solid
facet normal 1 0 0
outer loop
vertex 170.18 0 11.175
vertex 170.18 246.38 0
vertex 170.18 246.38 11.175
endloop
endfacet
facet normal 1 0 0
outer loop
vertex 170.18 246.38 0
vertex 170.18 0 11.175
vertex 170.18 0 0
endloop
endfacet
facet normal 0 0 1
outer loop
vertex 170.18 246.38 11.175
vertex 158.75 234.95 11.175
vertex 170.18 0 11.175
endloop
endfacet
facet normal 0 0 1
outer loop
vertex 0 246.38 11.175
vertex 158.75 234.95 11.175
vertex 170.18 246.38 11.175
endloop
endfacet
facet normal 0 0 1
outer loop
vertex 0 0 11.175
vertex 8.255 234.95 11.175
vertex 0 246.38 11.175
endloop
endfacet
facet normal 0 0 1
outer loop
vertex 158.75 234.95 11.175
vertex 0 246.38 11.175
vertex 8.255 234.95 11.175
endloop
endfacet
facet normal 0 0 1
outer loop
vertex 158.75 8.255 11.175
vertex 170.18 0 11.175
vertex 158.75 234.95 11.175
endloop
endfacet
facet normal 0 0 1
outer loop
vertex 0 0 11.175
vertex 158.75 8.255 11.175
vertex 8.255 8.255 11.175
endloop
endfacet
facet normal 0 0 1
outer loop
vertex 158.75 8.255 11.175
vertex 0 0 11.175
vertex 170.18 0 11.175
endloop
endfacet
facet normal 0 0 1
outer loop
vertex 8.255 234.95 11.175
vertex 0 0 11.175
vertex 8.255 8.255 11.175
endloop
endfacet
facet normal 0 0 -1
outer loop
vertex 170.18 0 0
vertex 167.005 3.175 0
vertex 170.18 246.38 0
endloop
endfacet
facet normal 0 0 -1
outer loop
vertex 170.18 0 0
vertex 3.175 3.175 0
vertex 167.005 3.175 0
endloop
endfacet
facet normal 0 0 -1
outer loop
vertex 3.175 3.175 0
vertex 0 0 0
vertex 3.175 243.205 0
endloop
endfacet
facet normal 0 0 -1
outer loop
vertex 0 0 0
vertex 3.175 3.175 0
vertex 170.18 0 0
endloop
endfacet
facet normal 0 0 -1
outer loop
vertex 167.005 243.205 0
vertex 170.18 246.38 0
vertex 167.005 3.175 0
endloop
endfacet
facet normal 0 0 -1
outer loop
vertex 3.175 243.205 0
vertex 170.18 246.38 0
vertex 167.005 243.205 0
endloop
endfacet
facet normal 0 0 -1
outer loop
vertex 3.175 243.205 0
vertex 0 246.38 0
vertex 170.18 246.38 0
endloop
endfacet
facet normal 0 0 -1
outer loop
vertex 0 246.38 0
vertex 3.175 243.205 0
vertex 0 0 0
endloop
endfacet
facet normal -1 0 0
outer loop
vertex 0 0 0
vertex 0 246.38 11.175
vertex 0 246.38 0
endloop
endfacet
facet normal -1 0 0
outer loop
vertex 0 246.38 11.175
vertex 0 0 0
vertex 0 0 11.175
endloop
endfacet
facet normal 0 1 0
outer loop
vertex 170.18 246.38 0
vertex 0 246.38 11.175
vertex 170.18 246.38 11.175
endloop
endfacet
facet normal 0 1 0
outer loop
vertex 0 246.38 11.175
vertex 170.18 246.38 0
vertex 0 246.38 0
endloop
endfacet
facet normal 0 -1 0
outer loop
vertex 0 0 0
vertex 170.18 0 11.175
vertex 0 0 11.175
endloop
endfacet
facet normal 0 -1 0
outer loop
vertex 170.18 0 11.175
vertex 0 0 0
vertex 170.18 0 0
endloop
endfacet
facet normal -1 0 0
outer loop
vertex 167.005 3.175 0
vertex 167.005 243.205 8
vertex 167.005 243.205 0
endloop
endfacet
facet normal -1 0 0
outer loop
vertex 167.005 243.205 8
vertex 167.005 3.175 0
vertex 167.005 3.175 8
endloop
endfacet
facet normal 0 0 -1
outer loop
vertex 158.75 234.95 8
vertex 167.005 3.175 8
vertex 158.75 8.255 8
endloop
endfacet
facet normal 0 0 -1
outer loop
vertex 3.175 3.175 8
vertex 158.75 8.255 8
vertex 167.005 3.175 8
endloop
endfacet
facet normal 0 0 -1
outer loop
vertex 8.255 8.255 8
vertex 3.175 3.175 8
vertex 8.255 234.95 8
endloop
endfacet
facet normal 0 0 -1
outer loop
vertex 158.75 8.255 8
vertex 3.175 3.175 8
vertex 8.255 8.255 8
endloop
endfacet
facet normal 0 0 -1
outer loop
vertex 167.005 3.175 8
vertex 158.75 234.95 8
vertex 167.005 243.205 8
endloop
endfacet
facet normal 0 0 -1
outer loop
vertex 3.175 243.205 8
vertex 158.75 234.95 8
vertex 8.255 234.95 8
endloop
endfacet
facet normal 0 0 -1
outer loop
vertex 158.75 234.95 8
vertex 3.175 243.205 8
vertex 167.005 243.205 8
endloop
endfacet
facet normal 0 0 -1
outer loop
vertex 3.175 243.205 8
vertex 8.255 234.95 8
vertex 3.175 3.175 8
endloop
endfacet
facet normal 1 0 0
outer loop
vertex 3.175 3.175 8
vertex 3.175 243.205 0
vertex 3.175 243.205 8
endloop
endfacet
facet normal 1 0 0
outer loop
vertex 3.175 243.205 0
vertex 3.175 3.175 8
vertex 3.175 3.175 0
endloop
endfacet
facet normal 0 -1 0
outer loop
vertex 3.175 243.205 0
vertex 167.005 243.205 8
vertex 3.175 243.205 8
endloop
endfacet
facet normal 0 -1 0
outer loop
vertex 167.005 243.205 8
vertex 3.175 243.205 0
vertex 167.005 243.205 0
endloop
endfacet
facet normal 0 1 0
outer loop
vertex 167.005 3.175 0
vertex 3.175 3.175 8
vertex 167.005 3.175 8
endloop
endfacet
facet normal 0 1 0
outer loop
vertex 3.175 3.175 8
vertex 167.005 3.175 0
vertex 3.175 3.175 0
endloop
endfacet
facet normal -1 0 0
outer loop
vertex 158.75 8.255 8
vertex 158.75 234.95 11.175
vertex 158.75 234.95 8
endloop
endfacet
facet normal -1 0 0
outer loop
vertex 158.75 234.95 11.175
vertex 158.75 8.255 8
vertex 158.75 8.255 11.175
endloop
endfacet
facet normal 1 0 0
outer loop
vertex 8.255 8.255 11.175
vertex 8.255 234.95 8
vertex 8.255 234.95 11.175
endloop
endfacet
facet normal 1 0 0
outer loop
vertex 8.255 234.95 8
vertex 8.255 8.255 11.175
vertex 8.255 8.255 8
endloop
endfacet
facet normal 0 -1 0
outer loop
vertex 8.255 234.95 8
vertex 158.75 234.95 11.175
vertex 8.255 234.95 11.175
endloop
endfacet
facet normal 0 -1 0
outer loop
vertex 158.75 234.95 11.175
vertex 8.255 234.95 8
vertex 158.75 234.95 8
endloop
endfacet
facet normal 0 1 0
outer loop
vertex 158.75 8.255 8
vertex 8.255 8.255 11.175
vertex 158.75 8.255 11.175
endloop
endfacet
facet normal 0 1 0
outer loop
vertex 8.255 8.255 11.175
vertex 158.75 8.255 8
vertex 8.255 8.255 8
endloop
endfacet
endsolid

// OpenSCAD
inch = 25.4;

picture_x = 6.05 * inch;
picture_y = 9.05 * inch;
picture_z = .95;

wall_thickness = .2 * inch;

frame_x = picture_x + (wall_thickness * 2);
frame_y = picture_y + (wall_thickness * 2);
frame_z = 8;

overhang = (1/8 * inch);

echo(overhang);

outside_x = frame_x + (overhang * 2);
outside_y = frame_y + (overhang * 2);
outside_z = frame_z + overhang;

picture_inset = overhang + wall_thickness;

difference() {
    cube([outside_x, outside_y, outside_z]);
    
    translate([overhang, overhang, 0]) {
        cube([frame_x, frame_y, frame_z]);
    }
    
    translate([picture_inset, picture_inset, frame_z]) {
        color([0, 0, 1])
        cube([(picture_x - overhang), (picture_y - overhang), frame_z]);
    }
}
